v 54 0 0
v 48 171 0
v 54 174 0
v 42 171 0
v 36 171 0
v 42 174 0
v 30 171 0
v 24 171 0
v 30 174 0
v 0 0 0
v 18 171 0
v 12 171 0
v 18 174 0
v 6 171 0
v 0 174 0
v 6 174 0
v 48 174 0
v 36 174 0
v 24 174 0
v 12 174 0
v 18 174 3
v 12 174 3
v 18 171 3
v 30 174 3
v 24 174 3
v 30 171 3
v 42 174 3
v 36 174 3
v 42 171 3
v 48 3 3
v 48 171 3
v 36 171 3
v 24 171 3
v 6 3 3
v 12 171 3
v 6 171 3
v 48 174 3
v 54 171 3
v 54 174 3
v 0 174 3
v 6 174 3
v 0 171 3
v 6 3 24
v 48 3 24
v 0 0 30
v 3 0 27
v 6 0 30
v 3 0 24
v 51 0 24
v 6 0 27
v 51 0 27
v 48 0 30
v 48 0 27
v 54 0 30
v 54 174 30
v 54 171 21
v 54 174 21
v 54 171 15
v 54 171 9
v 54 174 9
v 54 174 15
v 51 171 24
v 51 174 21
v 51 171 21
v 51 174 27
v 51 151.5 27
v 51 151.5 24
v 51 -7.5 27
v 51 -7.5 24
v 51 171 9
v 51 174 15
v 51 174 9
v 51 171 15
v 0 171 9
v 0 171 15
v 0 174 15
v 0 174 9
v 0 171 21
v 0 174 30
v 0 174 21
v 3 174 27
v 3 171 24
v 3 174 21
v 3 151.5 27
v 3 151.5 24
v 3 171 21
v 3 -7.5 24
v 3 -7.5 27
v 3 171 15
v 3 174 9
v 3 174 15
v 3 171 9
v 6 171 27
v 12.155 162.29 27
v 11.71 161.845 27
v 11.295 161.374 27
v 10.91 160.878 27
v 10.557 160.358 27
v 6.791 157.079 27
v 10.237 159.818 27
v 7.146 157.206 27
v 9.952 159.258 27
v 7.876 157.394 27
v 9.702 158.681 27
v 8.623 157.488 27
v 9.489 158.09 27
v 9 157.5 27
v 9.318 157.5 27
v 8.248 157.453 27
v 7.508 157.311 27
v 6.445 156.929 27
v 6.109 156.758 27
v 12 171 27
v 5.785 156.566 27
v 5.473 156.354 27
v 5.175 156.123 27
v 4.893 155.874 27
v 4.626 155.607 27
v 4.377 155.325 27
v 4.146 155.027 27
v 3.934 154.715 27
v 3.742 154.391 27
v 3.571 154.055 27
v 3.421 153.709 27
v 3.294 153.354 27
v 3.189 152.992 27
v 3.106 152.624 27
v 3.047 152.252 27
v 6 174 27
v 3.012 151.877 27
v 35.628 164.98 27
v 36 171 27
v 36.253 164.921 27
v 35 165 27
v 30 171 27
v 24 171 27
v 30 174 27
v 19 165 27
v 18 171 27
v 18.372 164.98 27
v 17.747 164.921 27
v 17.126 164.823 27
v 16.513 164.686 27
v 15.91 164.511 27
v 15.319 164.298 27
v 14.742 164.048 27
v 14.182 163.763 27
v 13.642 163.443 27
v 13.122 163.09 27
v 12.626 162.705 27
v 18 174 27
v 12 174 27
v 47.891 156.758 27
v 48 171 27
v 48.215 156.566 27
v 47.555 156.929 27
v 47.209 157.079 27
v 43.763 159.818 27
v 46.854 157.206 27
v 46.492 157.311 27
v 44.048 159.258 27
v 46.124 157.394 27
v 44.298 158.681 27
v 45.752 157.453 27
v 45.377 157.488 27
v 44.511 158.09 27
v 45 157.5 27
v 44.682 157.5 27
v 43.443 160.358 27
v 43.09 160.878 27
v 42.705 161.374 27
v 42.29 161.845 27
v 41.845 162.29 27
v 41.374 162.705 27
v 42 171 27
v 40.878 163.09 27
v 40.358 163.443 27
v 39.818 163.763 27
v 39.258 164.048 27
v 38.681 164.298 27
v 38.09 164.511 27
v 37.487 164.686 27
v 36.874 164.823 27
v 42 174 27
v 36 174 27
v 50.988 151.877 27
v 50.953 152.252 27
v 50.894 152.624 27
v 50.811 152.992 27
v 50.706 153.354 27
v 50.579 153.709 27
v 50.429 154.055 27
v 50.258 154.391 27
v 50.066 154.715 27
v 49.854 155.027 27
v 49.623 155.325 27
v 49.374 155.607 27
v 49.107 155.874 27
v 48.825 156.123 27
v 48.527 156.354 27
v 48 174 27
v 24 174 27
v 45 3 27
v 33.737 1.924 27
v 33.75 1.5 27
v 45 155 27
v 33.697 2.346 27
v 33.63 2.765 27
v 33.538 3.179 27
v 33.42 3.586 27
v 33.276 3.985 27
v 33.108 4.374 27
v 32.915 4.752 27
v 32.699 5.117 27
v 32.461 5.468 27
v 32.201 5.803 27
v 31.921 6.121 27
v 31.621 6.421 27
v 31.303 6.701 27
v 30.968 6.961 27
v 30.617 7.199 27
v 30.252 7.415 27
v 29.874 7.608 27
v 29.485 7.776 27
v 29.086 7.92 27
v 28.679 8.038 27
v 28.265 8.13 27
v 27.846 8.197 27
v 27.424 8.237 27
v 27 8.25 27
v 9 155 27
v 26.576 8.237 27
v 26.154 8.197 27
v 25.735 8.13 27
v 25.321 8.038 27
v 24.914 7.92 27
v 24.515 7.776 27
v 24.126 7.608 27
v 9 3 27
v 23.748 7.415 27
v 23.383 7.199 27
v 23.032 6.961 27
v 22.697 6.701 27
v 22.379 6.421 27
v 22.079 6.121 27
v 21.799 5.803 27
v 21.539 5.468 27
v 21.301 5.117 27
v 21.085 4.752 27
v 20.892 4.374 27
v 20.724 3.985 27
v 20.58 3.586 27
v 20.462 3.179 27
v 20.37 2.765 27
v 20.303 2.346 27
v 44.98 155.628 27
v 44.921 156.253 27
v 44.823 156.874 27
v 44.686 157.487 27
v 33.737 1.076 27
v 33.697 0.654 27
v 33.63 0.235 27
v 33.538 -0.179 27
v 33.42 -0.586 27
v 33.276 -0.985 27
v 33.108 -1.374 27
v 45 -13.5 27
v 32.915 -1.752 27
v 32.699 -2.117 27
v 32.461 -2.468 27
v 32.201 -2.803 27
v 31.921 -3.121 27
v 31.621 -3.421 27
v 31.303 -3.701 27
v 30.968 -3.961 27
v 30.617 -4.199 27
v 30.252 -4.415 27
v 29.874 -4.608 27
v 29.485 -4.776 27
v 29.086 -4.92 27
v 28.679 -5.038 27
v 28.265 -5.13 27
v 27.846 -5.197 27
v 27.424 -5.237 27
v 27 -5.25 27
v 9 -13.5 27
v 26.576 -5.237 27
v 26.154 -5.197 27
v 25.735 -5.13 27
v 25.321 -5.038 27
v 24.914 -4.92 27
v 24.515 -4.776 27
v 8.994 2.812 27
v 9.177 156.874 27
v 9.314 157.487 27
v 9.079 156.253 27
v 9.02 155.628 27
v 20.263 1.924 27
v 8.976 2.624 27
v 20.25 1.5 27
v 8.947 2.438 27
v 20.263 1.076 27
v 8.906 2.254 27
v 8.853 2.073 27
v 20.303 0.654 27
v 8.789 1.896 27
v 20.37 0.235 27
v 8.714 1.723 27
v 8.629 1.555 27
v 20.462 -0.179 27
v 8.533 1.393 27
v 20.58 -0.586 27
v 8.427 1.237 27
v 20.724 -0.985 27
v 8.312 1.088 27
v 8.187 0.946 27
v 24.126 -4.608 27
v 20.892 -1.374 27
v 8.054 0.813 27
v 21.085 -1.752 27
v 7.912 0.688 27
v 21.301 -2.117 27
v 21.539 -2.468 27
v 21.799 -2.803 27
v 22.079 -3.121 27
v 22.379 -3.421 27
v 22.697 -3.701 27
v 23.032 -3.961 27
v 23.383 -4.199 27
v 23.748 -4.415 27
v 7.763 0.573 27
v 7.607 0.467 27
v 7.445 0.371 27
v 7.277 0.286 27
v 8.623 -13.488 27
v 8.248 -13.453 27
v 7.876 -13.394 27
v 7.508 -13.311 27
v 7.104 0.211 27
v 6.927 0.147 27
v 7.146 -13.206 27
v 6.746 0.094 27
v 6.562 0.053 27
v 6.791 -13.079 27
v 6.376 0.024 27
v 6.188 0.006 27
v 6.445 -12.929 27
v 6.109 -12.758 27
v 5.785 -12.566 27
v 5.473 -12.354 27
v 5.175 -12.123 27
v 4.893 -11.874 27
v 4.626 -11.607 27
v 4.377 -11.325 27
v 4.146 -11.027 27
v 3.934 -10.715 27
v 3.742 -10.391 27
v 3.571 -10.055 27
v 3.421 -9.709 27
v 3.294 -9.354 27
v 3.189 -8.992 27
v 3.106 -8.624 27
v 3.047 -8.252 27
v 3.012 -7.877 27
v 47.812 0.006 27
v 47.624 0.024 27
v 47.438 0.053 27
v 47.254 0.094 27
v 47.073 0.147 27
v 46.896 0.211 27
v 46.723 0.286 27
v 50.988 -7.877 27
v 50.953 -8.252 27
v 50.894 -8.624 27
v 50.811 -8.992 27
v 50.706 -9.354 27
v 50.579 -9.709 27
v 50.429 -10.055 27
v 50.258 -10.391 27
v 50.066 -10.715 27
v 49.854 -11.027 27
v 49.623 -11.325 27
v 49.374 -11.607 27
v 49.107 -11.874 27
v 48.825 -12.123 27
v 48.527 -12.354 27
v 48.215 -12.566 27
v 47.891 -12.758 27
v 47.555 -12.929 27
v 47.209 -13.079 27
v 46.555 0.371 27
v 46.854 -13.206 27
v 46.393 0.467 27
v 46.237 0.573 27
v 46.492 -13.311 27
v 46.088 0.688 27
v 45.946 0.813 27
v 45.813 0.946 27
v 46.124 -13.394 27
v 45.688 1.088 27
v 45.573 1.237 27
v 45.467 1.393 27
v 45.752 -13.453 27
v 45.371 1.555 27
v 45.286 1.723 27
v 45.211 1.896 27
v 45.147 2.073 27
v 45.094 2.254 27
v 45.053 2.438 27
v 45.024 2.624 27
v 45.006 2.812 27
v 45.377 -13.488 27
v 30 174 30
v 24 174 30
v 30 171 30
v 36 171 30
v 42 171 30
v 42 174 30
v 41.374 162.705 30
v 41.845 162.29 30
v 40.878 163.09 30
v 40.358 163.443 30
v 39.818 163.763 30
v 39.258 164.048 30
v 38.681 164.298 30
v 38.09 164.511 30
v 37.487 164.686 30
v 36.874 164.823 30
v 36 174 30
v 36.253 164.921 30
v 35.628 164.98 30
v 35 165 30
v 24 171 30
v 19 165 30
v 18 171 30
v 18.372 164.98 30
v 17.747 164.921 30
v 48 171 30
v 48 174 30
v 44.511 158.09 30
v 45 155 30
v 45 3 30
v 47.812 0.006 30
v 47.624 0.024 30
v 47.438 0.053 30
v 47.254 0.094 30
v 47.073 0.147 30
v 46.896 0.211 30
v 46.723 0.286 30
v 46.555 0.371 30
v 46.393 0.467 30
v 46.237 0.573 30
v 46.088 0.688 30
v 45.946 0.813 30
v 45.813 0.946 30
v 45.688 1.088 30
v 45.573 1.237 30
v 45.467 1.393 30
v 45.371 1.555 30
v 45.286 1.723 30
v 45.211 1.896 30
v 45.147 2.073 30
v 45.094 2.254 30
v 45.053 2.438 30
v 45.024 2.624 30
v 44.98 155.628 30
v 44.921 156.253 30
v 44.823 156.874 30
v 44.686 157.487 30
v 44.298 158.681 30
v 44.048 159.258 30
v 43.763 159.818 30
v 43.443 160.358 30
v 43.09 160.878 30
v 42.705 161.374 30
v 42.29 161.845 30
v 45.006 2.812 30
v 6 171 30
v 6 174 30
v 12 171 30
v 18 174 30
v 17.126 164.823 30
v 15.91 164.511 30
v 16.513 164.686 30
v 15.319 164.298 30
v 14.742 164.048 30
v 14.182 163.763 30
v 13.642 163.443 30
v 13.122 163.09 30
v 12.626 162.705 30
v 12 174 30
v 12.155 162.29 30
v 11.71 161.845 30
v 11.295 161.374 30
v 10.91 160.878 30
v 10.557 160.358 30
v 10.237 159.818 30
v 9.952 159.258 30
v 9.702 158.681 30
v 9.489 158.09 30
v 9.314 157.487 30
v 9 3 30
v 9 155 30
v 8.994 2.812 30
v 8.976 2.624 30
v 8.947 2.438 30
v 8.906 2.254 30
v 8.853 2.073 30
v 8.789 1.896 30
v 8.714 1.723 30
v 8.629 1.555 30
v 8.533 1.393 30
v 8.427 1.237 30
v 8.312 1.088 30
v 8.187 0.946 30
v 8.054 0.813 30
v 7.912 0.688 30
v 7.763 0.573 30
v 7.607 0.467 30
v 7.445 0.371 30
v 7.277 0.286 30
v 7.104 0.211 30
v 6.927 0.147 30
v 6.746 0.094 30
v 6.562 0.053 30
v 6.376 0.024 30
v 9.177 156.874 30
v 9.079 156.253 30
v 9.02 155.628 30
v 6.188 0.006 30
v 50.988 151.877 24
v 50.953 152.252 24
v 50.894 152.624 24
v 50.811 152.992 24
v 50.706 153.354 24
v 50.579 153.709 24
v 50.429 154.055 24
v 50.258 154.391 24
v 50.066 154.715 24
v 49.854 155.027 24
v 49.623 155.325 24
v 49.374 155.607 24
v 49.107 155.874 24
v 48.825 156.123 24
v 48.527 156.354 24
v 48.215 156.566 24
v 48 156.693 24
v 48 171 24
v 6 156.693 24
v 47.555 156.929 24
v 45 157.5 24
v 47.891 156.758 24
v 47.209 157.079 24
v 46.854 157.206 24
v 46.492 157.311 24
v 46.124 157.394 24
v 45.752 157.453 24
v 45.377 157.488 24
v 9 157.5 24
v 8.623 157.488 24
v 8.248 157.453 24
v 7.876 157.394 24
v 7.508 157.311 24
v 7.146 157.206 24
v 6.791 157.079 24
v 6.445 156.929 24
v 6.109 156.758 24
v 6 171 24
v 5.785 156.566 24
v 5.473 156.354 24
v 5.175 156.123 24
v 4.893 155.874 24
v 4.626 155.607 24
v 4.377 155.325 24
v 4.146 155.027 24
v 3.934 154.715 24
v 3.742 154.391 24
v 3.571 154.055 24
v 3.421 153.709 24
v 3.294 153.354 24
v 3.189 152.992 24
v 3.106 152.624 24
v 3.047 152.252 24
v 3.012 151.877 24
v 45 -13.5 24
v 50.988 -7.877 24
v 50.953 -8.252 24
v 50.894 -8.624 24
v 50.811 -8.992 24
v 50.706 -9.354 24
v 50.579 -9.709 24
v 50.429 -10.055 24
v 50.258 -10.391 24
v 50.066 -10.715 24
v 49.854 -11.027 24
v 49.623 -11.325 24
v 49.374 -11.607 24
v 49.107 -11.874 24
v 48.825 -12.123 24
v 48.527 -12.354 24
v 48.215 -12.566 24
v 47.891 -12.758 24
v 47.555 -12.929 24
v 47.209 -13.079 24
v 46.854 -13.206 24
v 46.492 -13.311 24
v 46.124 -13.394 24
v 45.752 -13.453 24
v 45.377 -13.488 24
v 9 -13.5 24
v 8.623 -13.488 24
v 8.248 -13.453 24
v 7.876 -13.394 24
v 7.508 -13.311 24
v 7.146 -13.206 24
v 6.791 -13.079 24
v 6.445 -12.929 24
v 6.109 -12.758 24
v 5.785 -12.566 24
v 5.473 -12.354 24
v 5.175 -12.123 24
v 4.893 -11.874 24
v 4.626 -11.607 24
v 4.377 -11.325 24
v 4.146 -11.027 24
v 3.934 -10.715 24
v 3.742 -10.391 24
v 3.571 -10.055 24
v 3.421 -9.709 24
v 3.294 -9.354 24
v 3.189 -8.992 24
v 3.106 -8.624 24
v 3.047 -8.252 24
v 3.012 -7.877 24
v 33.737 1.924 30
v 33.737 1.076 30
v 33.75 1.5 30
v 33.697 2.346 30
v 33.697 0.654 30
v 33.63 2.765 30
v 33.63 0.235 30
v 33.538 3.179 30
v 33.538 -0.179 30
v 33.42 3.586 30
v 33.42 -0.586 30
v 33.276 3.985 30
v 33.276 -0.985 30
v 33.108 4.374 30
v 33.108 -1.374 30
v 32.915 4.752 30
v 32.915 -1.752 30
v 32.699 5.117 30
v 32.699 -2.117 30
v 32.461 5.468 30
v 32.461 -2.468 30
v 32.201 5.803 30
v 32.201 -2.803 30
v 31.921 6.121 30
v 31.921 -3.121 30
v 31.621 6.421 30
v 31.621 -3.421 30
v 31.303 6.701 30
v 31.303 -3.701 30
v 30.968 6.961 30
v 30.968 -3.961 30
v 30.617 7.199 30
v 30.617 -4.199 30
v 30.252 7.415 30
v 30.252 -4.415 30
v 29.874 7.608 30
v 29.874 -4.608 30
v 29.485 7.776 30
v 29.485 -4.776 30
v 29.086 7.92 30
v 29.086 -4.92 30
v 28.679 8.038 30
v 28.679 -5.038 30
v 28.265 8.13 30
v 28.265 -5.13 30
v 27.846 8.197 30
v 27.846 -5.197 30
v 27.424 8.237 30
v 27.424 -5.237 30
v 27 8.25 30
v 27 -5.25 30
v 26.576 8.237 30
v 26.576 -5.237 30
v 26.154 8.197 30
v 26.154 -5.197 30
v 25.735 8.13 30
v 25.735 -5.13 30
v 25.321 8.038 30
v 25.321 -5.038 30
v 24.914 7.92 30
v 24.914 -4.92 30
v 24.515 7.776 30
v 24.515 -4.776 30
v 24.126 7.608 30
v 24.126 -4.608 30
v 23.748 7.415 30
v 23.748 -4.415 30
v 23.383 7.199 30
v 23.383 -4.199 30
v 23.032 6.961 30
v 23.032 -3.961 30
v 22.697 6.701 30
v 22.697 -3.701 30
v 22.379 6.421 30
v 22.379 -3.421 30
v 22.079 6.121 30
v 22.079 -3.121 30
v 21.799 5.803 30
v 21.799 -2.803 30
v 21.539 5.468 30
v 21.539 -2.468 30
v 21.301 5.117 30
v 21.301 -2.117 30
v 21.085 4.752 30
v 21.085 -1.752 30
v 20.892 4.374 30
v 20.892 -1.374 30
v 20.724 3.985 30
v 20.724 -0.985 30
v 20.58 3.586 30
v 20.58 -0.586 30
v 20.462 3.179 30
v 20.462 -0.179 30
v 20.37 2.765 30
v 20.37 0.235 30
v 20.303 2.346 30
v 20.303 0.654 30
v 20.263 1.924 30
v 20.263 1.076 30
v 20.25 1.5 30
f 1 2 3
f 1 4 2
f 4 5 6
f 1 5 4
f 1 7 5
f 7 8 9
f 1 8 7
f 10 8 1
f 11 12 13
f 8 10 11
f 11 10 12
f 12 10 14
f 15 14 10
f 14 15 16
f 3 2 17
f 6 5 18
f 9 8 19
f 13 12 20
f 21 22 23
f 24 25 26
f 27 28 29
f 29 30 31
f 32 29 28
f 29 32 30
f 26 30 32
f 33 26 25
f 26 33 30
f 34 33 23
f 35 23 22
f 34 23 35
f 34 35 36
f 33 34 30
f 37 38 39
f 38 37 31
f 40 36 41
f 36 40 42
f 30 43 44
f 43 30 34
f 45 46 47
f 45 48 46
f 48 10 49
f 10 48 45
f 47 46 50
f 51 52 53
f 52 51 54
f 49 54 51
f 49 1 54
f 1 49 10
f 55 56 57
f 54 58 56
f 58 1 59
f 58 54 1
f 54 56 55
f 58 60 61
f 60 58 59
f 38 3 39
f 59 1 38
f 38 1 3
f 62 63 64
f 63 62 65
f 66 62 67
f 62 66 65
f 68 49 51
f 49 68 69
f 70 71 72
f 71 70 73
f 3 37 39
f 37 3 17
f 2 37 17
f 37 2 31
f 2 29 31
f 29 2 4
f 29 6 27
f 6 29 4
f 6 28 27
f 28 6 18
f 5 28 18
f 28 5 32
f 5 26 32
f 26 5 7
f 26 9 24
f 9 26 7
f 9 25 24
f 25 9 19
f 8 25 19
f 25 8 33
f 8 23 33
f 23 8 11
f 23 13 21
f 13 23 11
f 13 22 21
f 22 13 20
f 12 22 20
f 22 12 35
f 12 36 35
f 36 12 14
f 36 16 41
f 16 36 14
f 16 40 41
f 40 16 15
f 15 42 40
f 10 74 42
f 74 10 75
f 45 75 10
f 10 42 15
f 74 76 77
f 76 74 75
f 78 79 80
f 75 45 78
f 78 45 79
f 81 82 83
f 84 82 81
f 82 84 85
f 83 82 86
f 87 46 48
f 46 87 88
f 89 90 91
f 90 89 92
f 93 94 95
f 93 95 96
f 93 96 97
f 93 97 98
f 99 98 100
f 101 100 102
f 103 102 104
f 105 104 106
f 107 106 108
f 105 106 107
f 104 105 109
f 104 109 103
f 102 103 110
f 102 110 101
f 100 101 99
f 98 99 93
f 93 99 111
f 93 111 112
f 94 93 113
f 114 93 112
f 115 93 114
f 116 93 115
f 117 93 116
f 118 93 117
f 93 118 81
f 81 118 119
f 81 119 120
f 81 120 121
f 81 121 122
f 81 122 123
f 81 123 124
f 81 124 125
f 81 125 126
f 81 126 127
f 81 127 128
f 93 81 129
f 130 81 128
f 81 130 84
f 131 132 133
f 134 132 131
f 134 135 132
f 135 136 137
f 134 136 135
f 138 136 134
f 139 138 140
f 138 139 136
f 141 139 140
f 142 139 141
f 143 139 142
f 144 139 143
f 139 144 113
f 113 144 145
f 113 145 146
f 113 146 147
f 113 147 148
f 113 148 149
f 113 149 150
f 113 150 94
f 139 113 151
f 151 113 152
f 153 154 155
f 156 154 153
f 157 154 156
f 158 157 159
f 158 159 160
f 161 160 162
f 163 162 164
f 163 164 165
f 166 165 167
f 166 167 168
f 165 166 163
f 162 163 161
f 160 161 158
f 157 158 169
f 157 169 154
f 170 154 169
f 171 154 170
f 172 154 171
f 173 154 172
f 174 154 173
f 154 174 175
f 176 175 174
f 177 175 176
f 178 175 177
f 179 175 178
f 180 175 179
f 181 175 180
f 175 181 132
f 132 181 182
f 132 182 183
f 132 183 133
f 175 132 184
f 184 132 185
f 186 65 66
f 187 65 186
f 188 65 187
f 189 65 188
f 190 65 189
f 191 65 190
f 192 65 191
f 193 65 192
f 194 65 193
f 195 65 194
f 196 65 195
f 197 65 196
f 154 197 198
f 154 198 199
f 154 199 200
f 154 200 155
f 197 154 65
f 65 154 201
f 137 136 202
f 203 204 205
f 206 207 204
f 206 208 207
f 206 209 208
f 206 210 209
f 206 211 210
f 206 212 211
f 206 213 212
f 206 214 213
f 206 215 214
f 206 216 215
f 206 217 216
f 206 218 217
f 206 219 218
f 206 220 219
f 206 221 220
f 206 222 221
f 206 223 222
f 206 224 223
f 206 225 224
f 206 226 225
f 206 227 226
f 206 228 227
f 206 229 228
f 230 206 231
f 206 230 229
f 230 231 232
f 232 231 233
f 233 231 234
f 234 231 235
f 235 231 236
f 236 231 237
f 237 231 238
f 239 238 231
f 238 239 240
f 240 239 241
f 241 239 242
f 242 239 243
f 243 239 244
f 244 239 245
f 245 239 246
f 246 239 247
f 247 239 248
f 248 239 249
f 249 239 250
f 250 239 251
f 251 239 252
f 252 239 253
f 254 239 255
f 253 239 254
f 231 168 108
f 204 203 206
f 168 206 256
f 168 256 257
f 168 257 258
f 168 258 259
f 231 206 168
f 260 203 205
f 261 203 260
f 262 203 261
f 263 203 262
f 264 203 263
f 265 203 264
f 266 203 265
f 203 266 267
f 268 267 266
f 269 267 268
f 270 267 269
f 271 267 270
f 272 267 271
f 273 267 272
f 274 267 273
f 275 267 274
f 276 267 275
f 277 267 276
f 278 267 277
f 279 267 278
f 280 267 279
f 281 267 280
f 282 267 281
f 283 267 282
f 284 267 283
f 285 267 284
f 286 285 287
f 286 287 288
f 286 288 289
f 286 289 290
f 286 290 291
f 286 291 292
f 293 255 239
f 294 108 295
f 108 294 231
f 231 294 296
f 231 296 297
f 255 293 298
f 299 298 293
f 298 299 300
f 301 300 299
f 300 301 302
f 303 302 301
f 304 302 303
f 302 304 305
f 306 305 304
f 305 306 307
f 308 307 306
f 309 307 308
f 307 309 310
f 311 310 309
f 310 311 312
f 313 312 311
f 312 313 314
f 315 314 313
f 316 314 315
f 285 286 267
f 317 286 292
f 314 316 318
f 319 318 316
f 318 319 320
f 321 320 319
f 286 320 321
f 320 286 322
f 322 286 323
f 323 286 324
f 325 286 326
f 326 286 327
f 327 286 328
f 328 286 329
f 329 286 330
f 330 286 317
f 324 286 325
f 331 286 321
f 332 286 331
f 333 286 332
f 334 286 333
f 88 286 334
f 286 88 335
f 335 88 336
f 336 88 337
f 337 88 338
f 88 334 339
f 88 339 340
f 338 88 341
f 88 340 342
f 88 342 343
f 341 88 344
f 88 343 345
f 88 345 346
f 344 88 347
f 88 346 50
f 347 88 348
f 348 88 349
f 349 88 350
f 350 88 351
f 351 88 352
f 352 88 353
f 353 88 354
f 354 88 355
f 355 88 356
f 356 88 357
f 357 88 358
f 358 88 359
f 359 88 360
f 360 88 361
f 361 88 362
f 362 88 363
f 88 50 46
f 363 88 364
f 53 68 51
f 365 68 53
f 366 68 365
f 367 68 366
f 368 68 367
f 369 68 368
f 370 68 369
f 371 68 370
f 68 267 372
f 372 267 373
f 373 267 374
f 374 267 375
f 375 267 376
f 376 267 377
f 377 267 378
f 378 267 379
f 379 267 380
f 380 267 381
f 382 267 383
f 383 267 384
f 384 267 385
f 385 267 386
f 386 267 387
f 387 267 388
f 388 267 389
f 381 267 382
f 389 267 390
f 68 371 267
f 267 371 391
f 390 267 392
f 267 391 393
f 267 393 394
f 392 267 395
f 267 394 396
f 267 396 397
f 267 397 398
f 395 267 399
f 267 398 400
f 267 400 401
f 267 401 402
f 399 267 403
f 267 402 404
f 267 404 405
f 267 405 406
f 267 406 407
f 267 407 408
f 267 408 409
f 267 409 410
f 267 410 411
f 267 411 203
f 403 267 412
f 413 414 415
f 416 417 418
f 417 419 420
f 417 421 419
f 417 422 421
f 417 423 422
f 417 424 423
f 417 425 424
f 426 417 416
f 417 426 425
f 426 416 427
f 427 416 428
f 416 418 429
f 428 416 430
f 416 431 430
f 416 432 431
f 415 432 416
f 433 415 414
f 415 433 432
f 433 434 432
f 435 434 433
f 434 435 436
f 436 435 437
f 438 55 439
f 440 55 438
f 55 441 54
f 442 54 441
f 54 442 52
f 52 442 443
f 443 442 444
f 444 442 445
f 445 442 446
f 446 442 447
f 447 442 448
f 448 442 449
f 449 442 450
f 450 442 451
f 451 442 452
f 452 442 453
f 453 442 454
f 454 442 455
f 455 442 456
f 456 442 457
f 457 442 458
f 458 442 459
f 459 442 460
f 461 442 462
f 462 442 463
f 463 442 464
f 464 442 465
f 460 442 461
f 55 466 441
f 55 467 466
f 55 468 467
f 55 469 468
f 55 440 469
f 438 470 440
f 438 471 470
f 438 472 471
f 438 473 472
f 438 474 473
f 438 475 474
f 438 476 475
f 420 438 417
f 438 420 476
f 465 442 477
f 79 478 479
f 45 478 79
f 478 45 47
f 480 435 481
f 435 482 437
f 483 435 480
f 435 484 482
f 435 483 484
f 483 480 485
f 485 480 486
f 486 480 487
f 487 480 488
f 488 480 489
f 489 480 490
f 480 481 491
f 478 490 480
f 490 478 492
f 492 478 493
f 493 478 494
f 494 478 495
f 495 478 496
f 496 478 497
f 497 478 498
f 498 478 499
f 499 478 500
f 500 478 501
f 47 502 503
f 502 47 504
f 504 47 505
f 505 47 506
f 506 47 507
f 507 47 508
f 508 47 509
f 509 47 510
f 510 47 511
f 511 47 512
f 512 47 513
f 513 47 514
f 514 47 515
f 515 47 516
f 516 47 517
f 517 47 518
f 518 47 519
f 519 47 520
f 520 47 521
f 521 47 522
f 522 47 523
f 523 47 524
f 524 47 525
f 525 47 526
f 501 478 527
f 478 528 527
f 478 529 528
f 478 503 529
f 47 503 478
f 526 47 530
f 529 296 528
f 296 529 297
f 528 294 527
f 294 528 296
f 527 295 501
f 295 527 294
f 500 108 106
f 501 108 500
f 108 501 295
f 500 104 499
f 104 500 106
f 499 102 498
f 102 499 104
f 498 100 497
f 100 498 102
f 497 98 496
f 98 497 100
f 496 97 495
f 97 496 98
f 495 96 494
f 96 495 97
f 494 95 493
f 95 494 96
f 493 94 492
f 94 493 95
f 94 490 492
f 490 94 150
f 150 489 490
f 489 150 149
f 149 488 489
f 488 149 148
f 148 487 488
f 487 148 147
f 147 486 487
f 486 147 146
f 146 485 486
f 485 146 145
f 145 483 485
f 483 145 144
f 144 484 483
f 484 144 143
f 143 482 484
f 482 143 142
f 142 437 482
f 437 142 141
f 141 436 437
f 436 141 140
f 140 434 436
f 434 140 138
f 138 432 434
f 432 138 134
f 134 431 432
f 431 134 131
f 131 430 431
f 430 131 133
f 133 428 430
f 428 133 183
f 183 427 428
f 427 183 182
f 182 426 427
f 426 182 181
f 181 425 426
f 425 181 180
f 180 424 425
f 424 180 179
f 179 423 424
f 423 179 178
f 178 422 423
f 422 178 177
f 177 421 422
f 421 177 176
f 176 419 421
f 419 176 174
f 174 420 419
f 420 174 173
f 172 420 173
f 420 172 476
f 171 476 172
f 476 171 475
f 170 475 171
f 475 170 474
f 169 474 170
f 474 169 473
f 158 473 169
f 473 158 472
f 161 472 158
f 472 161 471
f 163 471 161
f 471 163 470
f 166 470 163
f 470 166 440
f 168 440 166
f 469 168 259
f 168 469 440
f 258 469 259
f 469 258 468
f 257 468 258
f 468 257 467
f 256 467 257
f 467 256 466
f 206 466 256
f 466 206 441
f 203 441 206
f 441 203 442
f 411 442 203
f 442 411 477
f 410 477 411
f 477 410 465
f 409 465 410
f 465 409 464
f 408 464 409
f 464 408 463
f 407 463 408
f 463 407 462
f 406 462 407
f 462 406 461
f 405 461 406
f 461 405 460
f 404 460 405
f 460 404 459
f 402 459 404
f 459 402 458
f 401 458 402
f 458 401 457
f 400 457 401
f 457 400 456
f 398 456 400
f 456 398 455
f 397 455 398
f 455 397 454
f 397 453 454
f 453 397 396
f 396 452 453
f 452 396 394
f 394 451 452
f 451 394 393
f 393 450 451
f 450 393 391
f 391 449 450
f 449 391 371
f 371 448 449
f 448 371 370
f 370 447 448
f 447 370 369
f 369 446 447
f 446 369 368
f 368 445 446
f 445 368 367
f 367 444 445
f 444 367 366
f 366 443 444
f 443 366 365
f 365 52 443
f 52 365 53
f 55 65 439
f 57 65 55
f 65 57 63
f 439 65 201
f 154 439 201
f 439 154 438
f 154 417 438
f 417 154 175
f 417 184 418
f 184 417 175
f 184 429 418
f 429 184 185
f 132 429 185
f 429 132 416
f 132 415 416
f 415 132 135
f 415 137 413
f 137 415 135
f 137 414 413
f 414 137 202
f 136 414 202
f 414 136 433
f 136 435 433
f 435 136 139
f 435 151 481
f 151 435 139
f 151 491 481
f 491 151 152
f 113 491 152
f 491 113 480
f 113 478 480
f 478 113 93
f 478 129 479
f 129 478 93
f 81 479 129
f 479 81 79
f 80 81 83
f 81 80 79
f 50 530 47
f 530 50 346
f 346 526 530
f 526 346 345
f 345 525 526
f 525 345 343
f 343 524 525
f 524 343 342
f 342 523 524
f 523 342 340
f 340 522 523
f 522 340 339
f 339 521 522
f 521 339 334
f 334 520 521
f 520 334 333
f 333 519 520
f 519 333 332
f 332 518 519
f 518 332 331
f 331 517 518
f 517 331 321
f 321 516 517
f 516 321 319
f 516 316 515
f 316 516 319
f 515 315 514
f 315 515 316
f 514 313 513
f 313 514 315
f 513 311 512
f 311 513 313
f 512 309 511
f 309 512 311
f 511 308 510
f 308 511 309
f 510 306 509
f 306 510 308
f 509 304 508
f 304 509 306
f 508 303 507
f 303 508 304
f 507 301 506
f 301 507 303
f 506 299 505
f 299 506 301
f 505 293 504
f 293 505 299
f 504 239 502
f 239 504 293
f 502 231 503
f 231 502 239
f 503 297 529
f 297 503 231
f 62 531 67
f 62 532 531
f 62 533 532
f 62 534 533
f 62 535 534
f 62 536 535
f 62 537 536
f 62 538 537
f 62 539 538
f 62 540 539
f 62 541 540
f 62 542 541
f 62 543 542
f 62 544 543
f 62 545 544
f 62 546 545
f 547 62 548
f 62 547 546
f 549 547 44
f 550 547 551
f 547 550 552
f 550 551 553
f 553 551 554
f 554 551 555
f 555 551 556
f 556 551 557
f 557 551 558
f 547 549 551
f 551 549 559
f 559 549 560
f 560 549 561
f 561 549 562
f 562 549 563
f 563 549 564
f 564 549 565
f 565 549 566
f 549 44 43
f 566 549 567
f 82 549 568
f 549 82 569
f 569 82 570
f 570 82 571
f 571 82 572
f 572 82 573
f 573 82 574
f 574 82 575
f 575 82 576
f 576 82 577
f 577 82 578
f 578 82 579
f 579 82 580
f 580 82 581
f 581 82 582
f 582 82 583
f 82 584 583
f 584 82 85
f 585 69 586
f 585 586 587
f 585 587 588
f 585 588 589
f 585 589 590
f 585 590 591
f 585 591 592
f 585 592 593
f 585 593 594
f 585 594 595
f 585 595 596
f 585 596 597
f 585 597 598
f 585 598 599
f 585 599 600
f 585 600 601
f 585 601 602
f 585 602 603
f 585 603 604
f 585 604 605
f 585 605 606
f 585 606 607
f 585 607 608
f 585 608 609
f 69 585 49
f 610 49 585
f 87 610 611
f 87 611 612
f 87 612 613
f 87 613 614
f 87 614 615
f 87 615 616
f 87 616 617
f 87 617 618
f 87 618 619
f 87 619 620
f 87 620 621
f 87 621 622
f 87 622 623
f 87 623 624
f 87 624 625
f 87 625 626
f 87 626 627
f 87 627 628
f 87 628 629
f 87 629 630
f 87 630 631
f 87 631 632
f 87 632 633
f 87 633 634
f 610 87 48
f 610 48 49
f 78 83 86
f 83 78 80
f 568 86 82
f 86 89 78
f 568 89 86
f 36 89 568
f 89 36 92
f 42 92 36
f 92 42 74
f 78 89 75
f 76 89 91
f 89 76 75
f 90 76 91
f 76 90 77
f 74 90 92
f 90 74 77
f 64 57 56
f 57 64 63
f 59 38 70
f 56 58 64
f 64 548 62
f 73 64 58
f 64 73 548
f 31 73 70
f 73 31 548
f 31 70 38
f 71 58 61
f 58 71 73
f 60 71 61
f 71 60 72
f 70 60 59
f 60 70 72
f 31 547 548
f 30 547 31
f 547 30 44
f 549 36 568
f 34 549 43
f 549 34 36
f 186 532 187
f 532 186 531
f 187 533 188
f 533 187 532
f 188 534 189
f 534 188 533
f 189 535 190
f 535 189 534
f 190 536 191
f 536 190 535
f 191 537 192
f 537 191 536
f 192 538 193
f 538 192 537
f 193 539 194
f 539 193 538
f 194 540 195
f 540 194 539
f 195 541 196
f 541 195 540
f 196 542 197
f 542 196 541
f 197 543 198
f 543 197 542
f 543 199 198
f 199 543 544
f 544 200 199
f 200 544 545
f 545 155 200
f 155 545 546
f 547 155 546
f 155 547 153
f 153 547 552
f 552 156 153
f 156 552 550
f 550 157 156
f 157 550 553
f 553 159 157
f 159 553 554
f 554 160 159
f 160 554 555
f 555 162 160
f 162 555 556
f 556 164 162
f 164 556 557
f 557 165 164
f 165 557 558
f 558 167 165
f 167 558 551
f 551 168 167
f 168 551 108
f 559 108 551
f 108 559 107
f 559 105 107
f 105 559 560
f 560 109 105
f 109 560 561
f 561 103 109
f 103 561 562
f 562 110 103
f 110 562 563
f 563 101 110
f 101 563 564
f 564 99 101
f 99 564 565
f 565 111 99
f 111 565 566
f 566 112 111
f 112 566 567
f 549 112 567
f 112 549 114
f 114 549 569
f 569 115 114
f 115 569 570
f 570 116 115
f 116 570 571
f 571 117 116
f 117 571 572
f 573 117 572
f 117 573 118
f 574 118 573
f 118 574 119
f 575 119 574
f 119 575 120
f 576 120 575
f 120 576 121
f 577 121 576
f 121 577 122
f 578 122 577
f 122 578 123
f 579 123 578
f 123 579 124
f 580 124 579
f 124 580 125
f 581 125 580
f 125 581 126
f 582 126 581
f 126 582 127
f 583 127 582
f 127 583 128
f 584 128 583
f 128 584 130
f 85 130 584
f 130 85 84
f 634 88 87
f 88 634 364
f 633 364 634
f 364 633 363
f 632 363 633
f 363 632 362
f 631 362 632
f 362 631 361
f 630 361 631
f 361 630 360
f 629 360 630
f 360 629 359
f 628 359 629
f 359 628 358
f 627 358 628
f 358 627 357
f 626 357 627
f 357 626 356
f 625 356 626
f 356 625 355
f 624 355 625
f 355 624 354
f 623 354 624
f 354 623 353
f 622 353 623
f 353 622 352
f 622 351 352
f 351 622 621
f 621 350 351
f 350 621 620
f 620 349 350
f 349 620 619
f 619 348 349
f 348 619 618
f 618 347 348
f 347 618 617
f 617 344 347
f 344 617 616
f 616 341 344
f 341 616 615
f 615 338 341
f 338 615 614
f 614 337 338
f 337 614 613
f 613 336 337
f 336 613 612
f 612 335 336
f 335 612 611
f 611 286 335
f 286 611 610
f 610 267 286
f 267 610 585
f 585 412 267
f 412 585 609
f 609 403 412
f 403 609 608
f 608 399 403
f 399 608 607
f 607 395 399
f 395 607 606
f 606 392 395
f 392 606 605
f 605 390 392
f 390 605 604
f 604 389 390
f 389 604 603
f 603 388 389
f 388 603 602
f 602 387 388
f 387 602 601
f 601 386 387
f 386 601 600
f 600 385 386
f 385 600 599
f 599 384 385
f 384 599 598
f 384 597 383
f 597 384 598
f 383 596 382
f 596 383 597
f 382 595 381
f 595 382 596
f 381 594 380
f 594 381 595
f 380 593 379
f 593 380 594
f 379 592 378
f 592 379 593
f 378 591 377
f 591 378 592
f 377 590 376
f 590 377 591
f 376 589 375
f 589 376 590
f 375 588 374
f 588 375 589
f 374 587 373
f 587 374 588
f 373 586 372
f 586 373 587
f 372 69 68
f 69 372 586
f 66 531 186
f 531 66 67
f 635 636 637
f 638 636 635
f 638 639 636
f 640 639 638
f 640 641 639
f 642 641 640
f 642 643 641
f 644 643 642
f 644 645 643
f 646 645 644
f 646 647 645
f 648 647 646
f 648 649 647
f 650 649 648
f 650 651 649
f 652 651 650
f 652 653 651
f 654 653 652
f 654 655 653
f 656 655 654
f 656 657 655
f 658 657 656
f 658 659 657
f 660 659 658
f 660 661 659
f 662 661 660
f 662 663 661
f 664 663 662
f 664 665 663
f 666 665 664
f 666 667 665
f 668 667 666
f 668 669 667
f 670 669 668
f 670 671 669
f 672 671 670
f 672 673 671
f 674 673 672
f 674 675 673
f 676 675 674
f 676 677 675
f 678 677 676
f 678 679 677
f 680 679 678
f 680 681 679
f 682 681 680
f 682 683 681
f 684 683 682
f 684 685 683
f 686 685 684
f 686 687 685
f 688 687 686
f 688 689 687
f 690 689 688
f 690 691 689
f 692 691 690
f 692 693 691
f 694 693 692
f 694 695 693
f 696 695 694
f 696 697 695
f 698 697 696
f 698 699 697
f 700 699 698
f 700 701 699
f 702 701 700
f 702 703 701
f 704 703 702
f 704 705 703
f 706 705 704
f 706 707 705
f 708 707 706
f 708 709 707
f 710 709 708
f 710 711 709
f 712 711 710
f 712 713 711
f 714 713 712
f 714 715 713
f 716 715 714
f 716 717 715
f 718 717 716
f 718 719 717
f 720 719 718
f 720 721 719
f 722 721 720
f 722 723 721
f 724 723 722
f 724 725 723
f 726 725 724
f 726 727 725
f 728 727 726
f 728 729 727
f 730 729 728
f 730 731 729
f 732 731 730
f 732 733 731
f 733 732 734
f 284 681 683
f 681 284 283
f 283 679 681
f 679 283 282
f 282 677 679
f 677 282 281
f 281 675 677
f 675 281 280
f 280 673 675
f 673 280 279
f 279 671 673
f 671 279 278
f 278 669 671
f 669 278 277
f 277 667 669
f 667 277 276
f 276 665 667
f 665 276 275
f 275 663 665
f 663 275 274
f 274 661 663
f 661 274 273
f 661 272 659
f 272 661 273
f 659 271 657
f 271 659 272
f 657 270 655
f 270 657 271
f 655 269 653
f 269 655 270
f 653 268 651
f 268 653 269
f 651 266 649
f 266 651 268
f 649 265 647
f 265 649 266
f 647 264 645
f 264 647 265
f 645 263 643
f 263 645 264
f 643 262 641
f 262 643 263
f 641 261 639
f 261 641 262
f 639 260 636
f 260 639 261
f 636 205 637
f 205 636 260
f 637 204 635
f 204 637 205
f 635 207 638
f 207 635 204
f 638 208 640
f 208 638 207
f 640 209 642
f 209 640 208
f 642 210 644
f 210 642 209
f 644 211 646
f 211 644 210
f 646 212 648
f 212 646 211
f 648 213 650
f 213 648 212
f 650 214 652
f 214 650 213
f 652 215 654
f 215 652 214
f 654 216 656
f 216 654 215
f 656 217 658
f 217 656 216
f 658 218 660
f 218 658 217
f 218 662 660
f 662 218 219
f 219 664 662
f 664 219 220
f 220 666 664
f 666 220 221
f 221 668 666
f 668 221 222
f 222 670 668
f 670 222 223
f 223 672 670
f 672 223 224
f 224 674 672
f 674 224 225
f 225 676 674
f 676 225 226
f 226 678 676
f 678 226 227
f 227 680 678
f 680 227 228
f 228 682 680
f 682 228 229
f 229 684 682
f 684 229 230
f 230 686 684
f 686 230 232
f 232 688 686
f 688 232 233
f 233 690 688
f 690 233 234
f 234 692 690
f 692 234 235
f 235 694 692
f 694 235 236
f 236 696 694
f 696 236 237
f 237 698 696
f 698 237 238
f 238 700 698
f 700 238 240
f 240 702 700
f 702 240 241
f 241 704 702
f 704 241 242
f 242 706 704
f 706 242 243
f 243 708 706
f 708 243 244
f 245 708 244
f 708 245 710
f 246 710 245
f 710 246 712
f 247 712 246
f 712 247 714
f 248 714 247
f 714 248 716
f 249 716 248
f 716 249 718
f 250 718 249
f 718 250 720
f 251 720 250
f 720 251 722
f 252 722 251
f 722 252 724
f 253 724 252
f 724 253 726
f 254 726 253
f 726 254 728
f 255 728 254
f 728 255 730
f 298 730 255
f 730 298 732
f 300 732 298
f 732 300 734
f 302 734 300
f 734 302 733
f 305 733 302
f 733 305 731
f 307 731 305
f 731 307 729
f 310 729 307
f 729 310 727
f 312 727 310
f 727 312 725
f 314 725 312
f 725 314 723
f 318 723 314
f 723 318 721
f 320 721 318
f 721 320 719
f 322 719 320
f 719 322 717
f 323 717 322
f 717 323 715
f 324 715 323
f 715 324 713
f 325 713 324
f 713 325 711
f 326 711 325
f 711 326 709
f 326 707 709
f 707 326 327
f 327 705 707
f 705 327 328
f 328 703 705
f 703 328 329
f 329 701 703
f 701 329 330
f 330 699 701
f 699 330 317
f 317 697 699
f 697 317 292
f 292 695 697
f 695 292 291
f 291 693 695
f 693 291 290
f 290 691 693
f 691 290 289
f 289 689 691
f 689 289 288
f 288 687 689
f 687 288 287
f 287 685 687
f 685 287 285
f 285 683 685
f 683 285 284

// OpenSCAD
/* Rocchini J-F 29/11/2018 */
/* slide box generator */
/* enter theorical external dimensions of the box*/
length=171;
width=52;
height=24;
material_thickness=3;
/* 0 assembled 3D view*/
/* 1 2D elements export as  .SVG*/
view=0;

vue=view;
long=length;
larg=width;
haut=height;
ep_mat=material_thickness;


$fn=100;
module quartderond(lgr=30){
   difference(){
       square([lgr,lgr], center="true");
       circle(lgr);
   }
  }  
  
modulo=ep_mat*2;  
longueur=(1+2*floor(long/modulo/2))*modulo;
largeur=  (1+2*floor(larg/modulo/2))*modulo;
hauteur= (1+2*floor(haut/modulo/2))*modulo;  
 echo("real ext. lenght",longueur);
 echo("real ext. width",largeur); 
 echo("real ext. height ",hauteur);
 echo("real int. length",longueur-2*ep_mat);
 echo("real int. width",largeur-4*ep_mat); 
 echo("real int. height",hauteur-3*ep_mat);  
  
module horizontal_2D(longueur, largeur,ep_mat){
    difference(){
        square([largeur,longueur]);
        for(i=[ep_mat*2:ep_mat*4:largeur]){
            for(j=[0,longueur-ep_mat]){
                translate([i,j]) square([ep_mat*2,ep_mat]);
            }
        }
        for(i=[ep_mat*2:ep_mat*4:longueur]){
            for(j=[0,largeur-ep_mat]){
                translate([j,i]) square([ep_mat,ep_mat*2]);
            }
        }
    }
}

module fond_2D(longueur, largeur,ep_mat){
     horizontal_2D(longueur, largeur,ep_mat);
}

module dessus_2D(longueur, largeur,ep_mat){
union(){    
    difference(){
        horizontal_2D(longueur, largeur,ep_mat);
        translate([3*ep_mat,-3*ep_mat,0]) square([largeur-6*ep_mat,longueur]);
}
translate([2*ep_mat,ep_mat]) circle(ep_mat);
translate([largeur-2*ep_mat,ep_mat]) circle(ep_mat);
translate([3*ep_mat+10,longueur-3*ep_mat-10]) rotate([0,0,90])quartderond(10);
translate([largeur-3*ep_mat-10,longueur-3*ep_mat-10])  quartderond(10);
}
}

module arr_2D(largeur,hauteur,ep_mat){
    difference(){
    square([largeur,hauteur]);
    for(i=[0:4*ep_mat:largeur]){
            for(j=[0,hauteur-ep_mat]){
                translate([i,j]) square([ep_mat*2,ep_mat]);
            }
        }
     
   for(i=[-ep_mat:4*ep_mat:hauteur-ep_mat]){
            for(j=[0,largeur-ep_mat]){
                translate([j,i]) square([ep_mat,2*ep_mat]);
            }
        }
    }     
}

module av_2D(largeur,hauteur,ep_mat){
    difference(){
        arr_2D(largeur,hauteur,ep_mat);
        translate([0,hauteur-2*ep_mat,0]) square([largeur+1,3*ep_mat+1]);
    }
}

module cote_2D(longueur,hauteur,ep_mat){
     difference(){
        square([hauteur,longueur]);
        for(i=[ep_mat:4*ep_mat:hauteur-ep_mat]){
            for(j=[0,longueur-ep_mat]){
                translate([i,j]) square([ep_mat*2,ep_mat]);
            }
        }
        for(i=[0:ep_mat*4:longueur]){
            for(j=[0,hauteur-ep_mat]){
                translate([j,i]) square([ep_mat,ep_mat*2]);
            }
        }
    }
} 
module cote_int_2D(hauteur,longueur,ep_mat){
     square([hauteur-3*ep_mat,longueur-2*ep_mat]);
}
module separateur_2D(hauteur,largeur,ep_mat){
       square([hauteur-3*ep_mat,largeur-4*ep_mat]);
}   
module couvercle_2D(largeur,longueur,ep_mat){
    difference(){
       square([largeur-2*ep_mat,longueur-ep_mat]);
       translate([largeur-4*ep_mat,longueur-3*ep_mat]) quartderond(ep_mat*2);
       translate([ep_mat*2,longueur-3*ep_mat]) rotate([0,0,90]) quartderond(ep_mat*2);  
       translate([ep_mat*2,ep_mat*2]) rotate([0,0,-180]) quartderond(ep_mat*2);
       translate([largeur-ep_mat*4,ep_mat*2]) rotate([0,0,-90]) quartderond(ep_mat*2);
        translate([largeur/2-1.5*ep_mat,largeur/4,0]) square(ep_mat);
    } 
}
module bouton_2D(largeur,ep_mat){
    difference(){
       circle(d=largeur/4);
       translate([-ep_mat/2,-ep_mat/2,0]) square(ep_mat);     
    }
}
module pion_2D(ep_mat){
    square([ep_mat,ep_mat*2]);
}
    
//................................... 3D......................

module fond_3D(longueur, largeur,ep_mat){    
   linear_extrude(ep_mat) fond_2D(longueur, largeur,ep_mat);    
}
module dessus_3D(longueur, largeur,ep_mat){
   linear_extrude(ep_mat)  dessus_2D(longueur,largeur,ep_mat);
}

module arr_3D(largeur,hauteur,ep_mat){
    linear_extrude(ep_mat) arr_2D(largeur,hauteur,ep_mat);
}
module av_3D(largeur,hauteur,ep_mat){
    linear_extrude(ep_mat) av_2D(largeur,hauteur,ep_mat);
    
}
module cote_3D(longueur,hauteur,ep_mat){
    linear_extrude(ep_mat) cote_2D(longueur,hauteur,ep_mat);
}
module cote_int_3D(hauteur,longueur,ep_mat){
    linear_extrude(ep_mat) cote_int_2D(hauteur,longueur,ep_mat);
}
module couvercle_3D(largeur,longueur,ep_mat){
    linear_extrude(ep_mat) couvercle_2D(largeur,longueur,ep_mat);
}
module bouton_3D(largeur,ep_mat){
    linear_extrude(ep_mat) bouton_2D(largeur,ep_mat);
}
module separateur_3D(hauteur,largeur,ep_mat){
    linear_extrude(ep_mat) separateur_2D(hauteur,largeur,ep_mat);
}
module pion_3D(ep_mat){
    linear_extrude(ep_mat) pion_2D(ep_mat);
}

//****************** VUES *********************************/
if(vue==0){
    
 color("green")  fond_3D(longueur, largeur,ep_mat);
 translate([0,0,hauteur-ep_mat]) color("red") dessus_3D(longueur, largeur,ep_mat);
  translate([0,longueur-0.01,0])rotate([90,0,0])color("pink") arr_3D(largeur,hauteur,ep_mat);  
  translate([0,ep_mat,0]) rotate([90,0,0]) av_3D(largeur,hauteur,ep_mat);   
  translate([ep_mat,0,0]) rotate([0,-90,0]) color("blue")cote_3D(longueur,hauteur,ep_mat);   
  translate([largeur,0,0]) rotate([0,-90,0]) color("blue")cote_3D(longueur,hauteur,ep_mat); 
  translate([largeur-ep_mat,ep_mat,ep_mat]) rotate([0,-90,0]) color("brown")cote_int_3D(hauteur,longueur,ep_mat); 
  translate([2*ep_mat,ep_mat,ep_mat]) rotate([0,-90,0]) color("brown")cote_int_3D(hauteur,longueur,ep_mat); 
  translate([ep_mat,-largeur/4,hauteur-2*ep_mat]) color("grey") couvercle_3D(largeur,longueur,ep_mat); 
  translate([largeur/2,ep_mat/2,hauteur-ep_mat]) rotate([0,0,0]) color("red") bouton_3D(largeur,ep_mat);  
  translate([largeur/2-ep_mat/2,ep_mat,hauteur-ep_mat*2]) rotate([90,0,0]) color("black") pion_3D(ep_mat);  
}


if(vue==1){ 
   fond_2D(longueur, largeur,ep_mat);
   translate([largeur+2,0,0]) dessus_2D(longueur, largeur,ep_mat);
   translate([2*largeur+4+hauteur,0,0]) rotate([0,0,90]) av_2D(largeur,hauteur,ep_mat);
   translate([2*largeur+4+hauteur,largeur+2,0]) rotate([0,0,90]) arr_2D(largeur,hauteur,ep_mat);
    translate([2*largeur+4+4+hauteur,0,0]) cote_2D(longueur,hauteur,ep_mat);
    translate([2*largeur+4+4+4+2*hauteur,0,0]) cote_2D(longueur,hauteur,ep_mat);
   translate([2*largeur+14+3*hauteur,0,0]) couvercle_2D(largeur,longueur,ep_mat);
   translate([3*largeur/2,largeur,0])  bouton_2D(largeur,ep_mat);
    translate([ 3*largeur/2,0,0])  pion_2D(ep_mat);
    
    translate([3*largeur+14+3*hauteur,0,0]) cote_int_2D(hauteur,longueur,ep_mat);
    translate([3*largeur+14+4*hauteur,0,0]) cote_int_2D(hauteur,longueur,ep_mat);
   
}
